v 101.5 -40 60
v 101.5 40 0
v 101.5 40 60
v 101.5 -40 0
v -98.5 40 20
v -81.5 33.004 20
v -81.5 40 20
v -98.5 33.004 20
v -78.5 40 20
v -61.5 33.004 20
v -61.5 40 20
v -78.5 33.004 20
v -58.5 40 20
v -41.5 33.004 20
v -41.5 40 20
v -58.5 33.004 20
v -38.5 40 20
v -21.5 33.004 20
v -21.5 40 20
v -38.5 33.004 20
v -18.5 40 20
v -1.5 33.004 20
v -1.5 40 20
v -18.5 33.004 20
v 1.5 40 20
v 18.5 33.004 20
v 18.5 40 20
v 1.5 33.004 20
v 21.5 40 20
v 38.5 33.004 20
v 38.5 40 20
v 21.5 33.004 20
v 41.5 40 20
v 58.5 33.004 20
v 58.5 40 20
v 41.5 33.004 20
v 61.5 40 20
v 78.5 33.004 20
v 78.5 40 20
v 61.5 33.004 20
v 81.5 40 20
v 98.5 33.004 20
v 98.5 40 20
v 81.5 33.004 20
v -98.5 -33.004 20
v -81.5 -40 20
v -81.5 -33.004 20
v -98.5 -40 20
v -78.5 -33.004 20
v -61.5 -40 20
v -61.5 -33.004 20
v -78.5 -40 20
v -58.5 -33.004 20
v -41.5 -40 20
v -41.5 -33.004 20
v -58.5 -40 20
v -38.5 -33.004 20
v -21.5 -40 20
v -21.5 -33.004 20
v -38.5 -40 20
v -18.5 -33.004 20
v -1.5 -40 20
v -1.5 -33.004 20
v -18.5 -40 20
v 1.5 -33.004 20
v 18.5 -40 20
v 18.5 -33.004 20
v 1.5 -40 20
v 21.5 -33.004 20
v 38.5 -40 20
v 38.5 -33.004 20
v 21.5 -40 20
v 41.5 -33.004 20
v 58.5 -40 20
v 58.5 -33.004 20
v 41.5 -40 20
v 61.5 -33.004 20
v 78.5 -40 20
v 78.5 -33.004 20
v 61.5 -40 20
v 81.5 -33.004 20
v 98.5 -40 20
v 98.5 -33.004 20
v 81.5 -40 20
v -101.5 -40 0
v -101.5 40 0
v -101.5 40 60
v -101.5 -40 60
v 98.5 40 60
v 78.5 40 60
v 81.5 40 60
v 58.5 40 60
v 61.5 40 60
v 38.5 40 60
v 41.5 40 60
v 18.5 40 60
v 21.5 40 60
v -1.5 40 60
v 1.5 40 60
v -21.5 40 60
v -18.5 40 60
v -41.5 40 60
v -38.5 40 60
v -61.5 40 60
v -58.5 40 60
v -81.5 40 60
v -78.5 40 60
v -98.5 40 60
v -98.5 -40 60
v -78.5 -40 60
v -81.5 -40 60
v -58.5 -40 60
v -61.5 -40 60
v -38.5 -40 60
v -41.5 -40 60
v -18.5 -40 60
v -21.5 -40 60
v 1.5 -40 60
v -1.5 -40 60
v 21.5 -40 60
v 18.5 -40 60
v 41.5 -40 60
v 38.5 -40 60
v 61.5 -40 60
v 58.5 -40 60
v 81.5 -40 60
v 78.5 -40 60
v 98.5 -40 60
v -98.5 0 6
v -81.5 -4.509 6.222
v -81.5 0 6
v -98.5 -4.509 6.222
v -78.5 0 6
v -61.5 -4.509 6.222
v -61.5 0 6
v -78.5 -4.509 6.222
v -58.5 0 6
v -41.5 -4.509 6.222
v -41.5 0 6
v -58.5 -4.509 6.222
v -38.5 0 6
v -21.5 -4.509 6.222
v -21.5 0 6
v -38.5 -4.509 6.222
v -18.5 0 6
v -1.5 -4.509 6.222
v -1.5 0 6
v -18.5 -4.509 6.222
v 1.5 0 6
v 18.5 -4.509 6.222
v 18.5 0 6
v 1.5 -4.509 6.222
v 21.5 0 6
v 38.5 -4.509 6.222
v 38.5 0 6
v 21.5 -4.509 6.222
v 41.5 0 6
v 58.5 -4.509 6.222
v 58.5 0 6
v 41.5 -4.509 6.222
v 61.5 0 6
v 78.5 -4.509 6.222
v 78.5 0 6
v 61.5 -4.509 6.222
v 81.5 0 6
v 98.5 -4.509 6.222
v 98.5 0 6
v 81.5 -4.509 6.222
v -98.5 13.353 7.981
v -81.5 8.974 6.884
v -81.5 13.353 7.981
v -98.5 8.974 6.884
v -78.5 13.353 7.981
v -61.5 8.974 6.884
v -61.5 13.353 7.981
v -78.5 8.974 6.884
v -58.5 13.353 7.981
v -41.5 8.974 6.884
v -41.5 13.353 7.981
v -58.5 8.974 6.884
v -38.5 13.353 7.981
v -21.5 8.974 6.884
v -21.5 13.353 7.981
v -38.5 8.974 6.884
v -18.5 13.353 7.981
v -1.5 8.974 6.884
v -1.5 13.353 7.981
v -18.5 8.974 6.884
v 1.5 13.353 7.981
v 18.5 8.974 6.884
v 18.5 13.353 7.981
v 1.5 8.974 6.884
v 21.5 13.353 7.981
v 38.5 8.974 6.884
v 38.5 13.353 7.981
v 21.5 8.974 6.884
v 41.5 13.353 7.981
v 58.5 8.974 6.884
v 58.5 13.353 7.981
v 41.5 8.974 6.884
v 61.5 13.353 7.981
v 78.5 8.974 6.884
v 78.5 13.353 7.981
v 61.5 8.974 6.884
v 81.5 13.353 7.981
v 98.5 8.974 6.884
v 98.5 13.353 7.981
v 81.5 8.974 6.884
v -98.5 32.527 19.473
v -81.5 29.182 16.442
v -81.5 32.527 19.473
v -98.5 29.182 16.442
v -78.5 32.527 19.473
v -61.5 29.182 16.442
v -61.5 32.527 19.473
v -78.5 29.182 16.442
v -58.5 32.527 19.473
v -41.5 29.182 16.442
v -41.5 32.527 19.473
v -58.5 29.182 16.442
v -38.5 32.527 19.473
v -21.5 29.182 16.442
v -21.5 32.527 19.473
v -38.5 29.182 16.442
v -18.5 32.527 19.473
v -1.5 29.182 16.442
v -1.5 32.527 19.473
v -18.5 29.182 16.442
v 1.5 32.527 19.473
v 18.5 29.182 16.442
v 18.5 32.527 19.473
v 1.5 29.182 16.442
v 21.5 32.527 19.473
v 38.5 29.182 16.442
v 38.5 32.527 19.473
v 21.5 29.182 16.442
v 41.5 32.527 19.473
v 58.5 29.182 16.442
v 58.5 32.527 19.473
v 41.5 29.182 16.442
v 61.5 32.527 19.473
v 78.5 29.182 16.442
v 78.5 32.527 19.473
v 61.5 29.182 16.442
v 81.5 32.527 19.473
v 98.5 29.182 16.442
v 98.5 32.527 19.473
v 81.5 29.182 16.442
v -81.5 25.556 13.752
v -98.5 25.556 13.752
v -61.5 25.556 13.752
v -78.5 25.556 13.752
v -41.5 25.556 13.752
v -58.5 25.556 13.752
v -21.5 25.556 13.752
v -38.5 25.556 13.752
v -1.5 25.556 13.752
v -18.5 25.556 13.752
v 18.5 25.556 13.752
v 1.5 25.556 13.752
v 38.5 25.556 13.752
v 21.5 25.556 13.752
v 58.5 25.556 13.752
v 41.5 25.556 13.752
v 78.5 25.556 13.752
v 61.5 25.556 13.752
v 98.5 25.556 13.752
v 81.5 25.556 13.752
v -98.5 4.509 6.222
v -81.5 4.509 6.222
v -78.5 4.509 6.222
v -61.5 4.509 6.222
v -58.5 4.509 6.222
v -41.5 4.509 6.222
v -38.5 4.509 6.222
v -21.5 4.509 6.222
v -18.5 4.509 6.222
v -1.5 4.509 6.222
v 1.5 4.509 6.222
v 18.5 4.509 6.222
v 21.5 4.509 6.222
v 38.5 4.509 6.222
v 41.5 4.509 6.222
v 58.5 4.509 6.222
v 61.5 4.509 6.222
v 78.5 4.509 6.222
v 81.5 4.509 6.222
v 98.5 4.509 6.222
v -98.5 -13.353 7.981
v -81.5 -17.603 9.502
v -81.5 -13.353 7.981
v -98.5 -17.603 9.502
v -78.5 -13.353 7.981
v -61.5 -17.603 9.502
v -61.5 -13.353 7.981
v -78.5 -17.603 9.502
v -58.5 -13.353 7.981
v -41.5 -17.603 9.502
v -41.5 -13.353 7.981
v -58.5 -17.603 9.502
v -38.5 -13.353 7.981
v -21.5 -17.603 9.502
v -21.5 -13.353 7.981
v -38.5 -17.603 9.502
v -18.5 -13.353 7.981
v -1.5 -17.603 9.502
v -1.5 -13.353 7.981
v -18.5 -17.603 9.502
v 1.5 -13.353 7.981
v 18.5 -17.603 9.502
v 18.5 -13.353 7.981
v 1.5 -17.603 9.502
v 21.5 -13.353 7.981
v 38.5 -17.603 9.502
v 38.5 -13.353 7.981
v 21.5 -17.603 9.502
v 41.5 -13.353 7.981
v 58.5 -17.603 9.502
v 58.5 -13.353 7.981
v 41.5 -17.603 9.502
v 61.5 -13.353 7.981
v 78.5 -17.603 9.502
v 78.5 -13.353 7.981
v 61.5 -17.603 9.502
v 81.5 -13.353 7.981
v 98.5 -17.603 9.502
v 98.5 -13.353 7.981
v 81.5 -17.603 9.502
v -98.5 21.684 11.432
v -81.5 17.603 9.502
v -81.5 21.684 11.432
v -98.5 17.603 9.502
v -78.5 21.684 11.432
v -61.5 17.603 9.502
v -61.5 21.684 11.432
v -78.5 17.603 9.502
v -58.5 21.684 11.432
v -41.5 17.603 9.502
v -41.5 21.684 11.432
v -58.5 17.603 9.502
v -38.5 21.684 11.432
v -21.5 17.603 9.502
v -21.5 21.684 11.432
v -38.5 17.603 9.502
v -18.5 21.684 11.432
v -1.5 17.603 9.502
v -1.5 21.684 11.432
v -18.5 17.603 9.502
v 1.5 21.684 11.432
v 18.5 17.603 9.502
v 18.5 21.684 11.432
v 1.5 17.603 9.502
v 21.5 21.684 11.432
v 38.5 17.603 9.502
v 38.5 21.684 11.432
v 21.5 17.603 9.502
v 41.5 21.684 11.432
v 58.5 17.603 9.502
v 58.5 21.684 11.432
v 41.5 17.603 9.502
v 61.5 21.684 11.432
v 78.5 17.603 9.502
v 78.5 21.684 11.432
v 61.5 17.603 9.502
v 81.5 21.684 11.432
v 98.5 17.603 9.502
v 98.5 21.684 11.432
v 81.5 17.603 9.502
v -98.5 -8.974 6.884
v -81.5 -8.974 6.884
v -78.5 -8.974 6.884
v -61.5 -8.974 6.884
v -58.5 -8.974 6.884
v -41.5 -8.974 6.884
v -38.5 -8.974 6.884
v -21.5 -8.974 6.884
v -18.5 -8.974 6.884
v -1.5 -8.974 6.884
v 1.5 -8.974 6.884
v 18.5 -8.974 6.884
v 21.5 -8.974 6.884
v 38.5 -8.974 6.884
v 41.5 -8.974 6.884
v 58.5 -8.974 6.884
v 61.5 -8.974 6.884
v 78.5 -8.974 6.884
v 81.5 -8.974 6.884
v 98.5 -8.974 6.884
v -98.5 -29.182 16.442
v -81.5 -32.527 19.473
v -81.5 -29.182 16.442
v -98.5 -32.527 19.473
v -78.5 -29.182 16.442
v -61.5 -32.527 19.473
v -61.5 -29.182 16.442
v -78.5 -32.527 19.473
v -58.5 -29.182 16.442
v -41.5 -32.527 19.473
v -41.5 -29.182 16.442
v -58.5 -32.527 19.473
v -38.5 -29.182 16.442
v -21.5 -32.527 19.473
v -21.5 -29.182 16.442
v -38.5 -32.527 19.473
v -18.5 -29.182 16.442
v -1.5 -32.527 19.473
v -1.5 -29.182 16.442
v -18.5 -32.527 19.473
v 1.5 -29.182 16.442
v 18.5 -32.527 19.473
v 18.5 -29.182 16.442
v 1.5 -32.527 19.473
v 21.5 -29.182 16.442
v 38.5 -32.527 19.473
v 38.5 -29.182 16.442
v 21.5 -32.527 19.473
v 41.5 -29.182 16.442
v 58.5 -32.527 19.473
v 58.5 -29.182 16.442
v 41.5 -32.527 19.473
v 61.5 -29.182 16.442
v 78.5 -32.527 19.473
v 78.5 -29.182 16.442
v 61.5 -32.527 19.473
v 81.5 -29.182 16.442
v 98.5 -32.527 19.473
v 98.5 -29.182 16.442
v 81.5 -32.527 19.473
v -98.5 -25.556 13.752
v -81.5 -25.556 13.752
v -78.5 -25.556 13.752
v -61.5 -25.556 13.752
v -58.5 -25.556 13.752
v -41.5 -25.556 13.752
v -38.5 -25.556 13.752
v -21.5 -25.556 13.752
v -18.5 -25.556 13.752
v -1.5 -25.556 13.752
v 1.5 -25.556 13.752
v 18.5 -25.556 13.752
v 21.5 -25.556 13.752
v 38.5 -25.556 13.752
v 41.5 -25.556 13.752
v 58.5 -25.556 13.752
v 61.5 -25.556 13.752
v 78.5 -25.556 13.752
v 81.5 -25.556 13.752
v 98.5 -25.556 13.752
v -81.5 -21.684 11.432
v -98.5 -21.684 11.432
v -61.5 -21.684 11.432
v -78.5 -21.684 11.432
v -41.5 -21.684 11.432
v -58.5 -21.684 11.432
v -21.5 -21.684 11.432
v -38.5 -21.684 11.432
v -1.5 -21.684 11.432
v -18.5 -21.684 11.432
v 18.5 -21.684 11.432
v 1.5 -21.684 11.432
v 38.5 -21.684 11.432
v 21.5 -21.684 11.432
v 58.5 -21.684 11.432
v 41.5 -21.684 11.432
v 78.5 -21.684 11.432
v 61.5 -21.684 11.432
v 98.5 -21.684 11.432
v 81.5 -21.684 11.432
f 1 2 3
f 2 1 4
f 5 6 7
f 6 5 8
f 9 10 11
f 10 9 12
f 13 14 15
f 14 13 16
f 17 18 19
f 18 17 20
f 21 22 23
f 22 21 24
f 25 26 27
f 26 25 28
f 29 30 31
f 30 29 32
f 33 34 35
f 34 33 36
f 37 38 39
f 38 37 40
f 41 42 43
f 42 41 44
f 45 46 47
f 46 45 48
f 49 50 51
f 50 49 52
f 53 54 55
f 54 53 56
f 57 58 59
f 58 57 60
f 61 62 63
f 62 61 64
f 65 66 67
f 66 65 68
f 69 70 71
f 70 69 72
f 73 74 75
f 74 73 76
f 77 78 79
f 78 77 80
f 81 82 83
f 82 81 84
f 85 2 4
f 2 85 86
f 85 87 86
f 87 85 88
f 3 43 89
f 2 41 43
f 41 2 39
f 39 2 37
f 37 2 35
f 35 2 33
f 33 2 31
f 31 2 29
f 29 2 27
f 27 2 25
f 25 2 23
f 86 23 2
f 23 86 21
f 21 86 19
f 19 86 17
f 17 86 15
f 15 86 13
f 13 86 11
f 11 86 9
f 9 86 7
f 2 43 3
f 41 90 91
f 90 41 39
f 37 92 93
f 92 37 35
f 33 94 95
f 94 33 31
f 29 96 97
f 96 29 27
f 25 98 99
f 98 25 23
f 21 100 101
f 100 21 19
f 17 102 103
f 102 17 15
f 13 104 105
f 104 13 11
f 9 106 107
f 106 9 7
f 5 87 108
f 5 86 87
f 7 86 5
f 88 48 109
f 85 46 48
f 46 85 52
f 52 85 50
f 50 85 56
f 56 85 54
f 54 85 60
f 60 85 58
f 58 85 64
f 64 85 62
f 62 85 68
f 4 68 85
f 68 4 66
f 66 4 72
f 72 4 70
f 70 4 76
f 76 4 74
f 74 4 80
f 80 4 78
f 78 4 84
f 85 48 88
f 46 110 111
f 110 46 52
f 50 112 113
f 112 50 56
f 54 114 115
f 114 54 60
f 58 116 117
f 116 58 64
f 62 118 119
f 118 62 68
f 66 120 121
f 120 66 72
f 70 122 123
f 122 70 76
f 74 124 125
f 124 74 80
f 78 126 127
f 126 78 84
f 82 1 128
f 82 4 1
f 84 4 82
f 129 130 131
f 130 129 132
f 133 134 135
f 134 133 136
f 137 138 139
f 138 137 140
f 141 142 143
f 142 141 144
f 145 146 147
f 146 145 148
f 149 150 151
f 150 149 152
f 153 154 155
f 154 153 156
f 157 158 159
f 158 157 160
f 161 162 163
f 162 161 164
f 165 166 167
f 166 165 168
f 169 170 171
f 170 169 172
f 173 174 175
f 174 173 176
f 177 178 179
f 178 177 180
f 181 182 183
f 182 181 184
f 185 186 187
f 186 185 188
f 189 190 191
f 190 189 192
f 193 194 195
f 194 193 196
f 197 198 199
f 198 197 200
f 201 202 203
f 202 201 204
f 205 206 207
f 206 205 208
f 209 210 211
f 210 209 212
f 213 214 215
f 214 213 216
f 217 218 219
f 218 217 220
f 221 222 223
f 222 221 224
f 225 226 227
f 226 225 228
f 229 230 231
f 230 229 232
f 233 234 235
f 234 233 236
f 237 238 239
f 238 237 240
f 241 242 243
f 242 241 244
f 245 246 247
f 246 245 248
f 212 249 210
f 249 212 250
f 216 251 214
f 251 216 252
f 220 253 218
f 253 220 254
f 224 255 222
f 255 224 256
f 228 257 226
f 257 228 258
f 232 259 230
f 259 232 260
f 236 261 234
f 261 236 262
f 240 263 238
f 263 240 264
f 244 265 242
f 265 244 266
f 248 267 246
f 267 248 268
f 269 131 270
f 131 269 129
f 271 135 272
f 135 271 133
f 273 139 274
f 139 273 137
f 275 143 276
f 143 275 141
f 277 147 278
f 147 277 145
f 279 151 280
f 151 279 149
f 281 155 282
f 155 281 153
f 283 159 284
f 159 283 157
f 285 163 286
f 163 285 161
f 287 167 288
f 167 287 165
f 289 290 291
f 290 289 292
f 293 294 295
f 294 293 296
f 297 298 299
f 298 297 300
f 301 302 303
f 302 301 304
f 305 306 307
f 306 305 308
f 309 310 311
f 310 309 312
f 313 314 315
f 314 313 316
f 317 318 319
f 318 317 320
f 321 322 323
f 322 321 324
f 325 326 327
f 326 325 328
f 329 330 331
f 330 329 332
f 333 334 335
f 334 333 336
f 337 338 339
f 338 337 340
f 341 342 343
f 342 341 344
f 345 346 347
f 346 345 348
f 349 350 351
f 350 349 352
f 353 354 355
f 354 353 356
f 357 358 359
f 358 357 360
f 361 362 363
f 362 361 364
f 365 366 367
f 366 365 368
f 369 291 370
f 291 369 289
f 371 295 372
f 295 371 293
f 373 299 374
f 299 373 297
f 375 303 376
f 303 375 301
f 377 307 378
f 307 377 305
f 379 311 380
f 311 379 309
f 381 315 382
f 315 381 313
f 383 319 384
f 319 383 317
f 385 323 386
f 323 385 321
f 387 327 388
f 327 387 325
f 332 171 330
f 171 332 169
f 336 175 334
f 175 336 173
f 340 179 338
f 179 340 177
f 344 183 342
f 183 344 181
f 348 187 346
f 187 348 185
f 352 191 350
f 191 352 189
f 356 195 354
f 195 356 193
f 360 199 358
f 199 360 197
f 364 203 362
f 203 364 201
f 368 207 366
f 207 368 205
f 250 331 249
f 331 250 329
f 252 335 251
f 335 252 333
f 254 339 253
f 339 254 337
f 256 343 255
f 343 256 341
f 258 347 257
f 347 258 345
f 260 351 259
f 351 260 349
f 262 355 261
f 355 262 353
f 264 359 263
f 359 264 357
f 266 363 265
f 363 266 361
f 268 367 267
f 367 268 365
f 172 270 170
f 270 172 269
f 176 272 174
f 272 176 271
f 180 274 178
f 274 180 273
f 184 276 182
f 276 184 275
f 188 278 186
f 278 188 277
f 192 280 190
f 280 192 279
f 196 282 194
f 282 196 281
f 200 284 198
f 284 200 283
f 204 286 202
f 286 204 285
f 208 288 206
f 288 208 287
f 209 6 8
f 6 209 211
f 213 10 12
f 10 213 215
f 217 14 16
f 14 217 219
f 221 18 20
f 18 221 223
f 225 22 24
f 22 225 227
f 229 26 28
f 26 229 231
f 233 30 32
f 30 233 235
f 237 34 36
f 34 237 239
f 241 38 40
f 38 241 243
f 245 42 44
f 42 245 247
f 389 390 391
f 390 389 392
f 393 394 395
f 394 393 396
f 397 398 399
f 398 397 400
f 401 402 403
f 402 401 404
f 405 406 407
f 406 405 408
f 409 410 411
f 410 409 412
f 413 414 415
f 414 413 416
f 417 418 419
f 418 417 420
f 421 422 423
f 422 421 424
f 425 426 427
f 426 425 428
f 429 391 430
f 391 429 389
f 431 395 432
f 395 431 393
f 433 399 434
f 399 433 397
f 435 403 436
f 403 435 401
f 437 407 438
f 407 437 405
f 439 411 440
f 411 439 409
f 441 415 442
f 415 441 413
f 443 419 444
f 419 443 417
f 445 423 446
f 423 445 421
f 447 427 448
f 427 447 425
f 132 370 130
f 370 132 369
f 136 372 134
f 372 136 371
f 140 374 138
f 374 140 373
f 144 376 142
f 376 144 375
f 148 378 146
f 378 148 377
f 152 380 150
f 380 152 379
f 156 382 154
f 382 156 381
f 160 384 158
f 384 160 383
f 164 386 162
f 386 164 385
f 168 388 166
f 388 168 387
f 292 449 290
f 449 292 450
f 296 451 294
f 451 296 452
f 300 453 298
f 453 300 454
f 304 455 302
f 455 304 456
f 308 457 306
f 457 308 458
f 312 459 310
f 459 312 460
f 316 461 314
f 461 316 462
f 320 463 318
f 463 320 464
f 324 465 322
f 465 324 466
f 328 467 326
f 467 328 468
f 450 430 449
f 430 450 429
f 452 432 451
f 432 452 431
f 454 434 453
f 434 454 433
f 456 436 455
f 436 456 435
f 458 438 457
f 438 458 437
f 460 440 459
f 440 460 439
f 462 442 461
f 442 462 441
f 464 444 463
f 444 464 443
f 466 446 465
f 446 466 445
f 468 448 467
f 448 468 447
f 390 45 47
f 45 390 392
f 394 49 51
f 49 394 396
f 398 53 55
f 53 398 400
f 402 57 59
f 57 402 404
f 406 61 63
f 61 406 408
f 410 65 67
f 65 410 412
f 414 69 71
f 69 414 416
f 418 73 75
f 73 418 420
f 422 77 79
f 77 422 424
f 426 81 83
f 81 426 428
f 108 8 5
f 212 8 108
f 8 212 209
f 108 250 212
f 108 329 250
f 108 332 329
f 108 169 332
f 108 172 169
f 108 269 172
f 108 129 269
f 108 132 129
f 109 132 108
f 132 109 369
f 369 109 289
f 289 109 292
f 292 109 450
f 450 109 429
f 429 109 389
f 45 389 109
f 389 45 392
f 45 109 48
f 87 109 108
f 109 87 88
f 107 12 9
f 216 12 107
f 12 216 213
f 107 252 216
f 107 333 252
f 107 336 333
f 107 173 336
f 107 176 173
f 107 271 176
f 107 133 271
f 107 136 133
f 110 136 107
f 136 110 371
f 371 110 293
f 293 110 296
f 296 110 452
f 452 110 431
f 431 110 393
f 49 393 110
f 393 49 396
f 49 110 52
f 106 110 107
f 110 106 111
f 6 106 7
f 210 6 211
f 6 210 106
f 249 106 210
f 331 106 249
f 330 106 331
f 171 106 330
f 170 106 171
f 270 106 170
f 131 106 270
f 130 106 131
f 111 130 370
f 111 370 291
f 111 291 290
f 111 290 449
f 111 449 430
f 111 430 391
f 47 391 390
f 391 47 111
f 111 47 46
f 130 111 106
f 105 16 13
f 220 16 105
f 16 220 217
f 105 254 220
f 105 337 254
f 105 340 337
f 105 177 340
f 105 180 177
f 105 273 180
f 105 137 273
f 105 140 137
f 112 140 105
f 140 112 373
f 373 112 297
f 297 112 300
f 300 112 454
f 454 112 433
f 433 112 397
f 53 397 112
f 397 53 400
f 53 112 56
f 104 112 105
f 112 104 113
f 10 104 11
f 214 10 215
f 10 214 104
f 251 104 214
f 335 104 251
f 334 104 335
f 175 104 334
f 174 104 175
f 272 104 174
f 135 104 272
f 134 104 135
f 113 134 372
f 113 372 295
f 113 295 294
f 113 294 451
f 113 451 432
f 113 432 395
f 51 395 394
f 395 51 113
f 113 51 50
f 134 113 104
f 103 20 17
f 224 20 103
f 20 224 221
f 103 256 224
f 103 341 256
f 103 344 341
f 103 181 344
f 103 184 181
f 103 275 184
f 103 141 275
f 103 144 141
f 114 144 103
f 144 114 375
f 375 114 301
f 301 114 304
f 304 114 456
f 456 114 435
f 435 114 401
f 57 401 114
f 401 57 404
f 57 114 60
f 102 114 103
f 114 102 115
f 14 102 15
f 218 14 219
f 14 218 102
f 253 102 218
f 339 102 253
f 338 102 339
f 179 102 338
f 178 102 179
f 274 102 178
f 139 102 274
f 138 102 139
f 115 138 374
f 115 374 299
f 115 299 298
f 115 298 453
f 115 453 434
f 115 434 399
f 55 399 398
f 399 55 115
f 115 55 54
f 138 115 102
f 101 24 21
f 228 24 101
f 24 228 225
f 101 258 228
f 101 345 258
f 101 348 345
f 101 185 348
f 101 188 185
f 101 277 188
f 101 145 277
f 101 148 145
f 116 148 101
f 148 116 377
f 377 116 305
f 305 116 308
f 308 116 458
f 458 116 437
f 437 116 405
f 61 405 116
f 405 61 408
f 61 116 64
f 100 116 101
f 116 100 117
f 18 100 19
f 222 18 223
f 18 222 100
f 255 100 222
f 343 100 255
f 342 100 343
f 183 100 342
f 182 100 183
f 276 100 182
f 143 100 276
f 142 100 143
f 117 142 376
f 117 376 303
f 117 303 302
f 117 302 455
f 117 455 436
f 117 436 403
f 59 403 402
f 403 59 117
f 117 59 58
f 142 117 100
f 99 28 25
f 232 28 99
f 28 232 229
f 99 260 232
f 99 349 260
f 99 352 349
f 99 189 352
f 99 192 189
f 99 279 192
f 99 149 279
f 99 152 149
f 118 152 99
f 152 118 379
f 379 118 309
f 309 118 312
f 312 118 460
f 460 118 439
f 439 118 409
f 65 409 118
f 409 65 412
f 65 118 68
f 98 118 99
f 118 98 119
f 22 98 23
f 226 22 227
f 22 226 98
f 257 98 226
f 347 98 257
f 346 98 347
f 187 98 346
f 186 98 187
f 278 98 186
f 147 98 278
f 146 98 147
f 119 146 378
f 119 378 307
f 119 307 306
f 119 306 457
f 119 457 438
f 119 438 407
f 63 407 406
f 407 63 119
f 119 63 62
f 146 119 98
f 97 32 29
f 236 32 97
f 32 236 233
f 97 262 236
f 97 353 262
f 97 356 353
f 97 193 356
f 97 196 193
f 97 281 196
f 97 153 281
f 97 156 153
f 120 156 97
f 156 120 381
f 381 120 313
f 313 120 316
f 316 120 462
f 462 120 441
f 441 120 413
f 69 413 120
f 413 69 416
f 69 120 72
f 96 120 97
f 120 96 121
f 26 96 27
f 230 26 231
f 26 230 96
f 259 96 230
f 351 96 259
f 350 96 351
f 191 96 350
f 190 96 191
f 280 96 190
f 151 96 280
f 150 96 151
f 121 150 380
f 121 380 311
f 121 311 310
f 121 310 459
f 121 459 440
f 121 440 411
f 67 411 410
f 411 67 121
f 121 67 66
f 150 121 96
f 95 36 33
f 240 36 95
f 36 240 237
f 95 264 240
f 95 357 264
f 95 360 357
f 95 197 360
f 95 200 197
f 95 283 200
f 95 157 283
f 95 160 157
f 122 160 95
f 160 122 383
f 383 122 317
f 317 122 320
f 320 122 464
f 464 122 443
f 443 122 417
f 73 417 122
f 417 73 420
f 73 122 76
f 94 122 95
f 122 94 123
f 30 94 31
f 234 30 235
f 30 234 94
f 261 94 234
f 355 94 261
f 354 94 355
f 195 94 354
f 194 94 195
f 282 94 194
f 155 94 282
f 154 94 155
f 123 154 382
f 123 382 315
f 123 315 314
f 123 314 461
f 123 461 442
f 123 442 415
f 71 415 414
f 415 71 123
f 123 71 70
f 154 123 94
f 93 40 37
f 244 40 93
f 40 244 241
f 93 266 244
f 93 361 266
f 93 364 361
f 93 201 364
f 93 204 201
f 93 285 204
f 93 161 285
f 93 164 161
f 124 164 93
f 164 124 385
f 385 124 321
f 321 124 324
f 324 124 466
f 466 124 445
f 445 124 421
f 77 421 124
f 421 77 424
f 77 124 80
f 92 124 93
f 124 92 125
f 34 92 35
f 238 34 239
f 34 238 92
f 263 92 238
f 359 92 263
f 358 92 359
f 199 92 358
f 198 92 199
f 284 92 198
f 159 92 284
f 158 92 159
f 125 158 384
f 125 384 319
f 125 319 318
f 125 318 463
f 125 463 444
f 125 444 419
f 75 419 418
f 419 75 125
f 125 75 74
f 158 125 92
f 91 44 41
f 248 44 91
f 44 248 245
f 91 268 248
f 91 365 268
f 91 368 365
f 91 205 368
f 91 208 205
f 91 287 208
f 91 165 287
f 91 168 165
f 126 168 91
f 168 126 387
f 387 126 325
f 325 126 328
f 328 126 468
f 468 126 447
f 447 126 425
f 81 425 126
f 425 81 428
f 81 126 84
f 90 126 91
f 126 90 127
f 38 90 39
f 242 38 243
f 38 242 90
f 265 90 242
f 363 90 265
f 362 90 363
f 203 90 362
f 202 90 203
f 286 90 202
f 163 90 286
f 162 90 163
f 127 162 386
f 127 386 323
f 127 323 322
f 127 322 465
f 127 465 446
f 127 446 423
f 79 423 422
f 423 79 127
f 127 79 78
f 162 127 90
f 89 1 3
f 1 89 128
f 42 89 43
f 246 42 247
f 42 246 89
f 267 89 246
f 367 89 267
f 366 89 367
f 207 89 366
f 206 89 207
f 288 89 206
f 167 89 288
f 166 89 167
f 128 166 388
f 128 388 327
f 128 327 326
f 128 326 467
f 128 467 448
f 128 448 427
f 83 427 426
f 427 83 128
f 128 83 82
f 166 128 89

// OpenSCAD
// KNOWN-RIGHT ALTERNATIVE (must pass): a correct rack with a coarser cradle cylinder ($fn = 64)
// Rack for ten 90 mm Petri dishes standing on edge
// Category: benchware. A base with a curved cradle (a 46 mm radius channel along the rack) in which
// the dish rims rest, and eleven solid divider plates that keep the dishes upright, 17 mm apart.
// Print: PLA or PETG, as used (base on the bed), 0.2 mm layers; the rack is 203 mm long, so check
// it fits your bed diagonally if needed.
// SPDX-License-Identifier: CERN-OHL-P-2.0

/* [Rack] */
base = [203, 80, 20];     // X, Y, Z [mm]
cradle_r = 46;            // 90 mm dish + 2 mm clearance
cradle_axis_z = 52;       // cradle bottom at z = 52 - 46 = 6
n_fins = 11;
fin_t = 3;                // divider thickness (X)
fin_pitch = 20;           // centre-to-centre; slots are 20 - 3 = 17 mm wide
fin_h = 60;               // dividers rise from z = 0 to 60

/* [Hidden] */
eps = 0.01;

union() {
    difference() {
        translate([-base.x / 2, -base.y / 2, 0]) cube(base);
        translate([-base.x / 2 - 1, 0, cradle_axis_z]) rotate([0, 90, 0])
            cylinder(r = cradle_r, h = base.x + 2, $fn = 64);
    }
    for (i = [0 : n_fins - 1])
        translate([(i - (n_fins - 1) / 2) * fin_pitch - fin_t / 2, -base.y / 2, 0]) cube([fin_t, base.y, fin_h]);
}
